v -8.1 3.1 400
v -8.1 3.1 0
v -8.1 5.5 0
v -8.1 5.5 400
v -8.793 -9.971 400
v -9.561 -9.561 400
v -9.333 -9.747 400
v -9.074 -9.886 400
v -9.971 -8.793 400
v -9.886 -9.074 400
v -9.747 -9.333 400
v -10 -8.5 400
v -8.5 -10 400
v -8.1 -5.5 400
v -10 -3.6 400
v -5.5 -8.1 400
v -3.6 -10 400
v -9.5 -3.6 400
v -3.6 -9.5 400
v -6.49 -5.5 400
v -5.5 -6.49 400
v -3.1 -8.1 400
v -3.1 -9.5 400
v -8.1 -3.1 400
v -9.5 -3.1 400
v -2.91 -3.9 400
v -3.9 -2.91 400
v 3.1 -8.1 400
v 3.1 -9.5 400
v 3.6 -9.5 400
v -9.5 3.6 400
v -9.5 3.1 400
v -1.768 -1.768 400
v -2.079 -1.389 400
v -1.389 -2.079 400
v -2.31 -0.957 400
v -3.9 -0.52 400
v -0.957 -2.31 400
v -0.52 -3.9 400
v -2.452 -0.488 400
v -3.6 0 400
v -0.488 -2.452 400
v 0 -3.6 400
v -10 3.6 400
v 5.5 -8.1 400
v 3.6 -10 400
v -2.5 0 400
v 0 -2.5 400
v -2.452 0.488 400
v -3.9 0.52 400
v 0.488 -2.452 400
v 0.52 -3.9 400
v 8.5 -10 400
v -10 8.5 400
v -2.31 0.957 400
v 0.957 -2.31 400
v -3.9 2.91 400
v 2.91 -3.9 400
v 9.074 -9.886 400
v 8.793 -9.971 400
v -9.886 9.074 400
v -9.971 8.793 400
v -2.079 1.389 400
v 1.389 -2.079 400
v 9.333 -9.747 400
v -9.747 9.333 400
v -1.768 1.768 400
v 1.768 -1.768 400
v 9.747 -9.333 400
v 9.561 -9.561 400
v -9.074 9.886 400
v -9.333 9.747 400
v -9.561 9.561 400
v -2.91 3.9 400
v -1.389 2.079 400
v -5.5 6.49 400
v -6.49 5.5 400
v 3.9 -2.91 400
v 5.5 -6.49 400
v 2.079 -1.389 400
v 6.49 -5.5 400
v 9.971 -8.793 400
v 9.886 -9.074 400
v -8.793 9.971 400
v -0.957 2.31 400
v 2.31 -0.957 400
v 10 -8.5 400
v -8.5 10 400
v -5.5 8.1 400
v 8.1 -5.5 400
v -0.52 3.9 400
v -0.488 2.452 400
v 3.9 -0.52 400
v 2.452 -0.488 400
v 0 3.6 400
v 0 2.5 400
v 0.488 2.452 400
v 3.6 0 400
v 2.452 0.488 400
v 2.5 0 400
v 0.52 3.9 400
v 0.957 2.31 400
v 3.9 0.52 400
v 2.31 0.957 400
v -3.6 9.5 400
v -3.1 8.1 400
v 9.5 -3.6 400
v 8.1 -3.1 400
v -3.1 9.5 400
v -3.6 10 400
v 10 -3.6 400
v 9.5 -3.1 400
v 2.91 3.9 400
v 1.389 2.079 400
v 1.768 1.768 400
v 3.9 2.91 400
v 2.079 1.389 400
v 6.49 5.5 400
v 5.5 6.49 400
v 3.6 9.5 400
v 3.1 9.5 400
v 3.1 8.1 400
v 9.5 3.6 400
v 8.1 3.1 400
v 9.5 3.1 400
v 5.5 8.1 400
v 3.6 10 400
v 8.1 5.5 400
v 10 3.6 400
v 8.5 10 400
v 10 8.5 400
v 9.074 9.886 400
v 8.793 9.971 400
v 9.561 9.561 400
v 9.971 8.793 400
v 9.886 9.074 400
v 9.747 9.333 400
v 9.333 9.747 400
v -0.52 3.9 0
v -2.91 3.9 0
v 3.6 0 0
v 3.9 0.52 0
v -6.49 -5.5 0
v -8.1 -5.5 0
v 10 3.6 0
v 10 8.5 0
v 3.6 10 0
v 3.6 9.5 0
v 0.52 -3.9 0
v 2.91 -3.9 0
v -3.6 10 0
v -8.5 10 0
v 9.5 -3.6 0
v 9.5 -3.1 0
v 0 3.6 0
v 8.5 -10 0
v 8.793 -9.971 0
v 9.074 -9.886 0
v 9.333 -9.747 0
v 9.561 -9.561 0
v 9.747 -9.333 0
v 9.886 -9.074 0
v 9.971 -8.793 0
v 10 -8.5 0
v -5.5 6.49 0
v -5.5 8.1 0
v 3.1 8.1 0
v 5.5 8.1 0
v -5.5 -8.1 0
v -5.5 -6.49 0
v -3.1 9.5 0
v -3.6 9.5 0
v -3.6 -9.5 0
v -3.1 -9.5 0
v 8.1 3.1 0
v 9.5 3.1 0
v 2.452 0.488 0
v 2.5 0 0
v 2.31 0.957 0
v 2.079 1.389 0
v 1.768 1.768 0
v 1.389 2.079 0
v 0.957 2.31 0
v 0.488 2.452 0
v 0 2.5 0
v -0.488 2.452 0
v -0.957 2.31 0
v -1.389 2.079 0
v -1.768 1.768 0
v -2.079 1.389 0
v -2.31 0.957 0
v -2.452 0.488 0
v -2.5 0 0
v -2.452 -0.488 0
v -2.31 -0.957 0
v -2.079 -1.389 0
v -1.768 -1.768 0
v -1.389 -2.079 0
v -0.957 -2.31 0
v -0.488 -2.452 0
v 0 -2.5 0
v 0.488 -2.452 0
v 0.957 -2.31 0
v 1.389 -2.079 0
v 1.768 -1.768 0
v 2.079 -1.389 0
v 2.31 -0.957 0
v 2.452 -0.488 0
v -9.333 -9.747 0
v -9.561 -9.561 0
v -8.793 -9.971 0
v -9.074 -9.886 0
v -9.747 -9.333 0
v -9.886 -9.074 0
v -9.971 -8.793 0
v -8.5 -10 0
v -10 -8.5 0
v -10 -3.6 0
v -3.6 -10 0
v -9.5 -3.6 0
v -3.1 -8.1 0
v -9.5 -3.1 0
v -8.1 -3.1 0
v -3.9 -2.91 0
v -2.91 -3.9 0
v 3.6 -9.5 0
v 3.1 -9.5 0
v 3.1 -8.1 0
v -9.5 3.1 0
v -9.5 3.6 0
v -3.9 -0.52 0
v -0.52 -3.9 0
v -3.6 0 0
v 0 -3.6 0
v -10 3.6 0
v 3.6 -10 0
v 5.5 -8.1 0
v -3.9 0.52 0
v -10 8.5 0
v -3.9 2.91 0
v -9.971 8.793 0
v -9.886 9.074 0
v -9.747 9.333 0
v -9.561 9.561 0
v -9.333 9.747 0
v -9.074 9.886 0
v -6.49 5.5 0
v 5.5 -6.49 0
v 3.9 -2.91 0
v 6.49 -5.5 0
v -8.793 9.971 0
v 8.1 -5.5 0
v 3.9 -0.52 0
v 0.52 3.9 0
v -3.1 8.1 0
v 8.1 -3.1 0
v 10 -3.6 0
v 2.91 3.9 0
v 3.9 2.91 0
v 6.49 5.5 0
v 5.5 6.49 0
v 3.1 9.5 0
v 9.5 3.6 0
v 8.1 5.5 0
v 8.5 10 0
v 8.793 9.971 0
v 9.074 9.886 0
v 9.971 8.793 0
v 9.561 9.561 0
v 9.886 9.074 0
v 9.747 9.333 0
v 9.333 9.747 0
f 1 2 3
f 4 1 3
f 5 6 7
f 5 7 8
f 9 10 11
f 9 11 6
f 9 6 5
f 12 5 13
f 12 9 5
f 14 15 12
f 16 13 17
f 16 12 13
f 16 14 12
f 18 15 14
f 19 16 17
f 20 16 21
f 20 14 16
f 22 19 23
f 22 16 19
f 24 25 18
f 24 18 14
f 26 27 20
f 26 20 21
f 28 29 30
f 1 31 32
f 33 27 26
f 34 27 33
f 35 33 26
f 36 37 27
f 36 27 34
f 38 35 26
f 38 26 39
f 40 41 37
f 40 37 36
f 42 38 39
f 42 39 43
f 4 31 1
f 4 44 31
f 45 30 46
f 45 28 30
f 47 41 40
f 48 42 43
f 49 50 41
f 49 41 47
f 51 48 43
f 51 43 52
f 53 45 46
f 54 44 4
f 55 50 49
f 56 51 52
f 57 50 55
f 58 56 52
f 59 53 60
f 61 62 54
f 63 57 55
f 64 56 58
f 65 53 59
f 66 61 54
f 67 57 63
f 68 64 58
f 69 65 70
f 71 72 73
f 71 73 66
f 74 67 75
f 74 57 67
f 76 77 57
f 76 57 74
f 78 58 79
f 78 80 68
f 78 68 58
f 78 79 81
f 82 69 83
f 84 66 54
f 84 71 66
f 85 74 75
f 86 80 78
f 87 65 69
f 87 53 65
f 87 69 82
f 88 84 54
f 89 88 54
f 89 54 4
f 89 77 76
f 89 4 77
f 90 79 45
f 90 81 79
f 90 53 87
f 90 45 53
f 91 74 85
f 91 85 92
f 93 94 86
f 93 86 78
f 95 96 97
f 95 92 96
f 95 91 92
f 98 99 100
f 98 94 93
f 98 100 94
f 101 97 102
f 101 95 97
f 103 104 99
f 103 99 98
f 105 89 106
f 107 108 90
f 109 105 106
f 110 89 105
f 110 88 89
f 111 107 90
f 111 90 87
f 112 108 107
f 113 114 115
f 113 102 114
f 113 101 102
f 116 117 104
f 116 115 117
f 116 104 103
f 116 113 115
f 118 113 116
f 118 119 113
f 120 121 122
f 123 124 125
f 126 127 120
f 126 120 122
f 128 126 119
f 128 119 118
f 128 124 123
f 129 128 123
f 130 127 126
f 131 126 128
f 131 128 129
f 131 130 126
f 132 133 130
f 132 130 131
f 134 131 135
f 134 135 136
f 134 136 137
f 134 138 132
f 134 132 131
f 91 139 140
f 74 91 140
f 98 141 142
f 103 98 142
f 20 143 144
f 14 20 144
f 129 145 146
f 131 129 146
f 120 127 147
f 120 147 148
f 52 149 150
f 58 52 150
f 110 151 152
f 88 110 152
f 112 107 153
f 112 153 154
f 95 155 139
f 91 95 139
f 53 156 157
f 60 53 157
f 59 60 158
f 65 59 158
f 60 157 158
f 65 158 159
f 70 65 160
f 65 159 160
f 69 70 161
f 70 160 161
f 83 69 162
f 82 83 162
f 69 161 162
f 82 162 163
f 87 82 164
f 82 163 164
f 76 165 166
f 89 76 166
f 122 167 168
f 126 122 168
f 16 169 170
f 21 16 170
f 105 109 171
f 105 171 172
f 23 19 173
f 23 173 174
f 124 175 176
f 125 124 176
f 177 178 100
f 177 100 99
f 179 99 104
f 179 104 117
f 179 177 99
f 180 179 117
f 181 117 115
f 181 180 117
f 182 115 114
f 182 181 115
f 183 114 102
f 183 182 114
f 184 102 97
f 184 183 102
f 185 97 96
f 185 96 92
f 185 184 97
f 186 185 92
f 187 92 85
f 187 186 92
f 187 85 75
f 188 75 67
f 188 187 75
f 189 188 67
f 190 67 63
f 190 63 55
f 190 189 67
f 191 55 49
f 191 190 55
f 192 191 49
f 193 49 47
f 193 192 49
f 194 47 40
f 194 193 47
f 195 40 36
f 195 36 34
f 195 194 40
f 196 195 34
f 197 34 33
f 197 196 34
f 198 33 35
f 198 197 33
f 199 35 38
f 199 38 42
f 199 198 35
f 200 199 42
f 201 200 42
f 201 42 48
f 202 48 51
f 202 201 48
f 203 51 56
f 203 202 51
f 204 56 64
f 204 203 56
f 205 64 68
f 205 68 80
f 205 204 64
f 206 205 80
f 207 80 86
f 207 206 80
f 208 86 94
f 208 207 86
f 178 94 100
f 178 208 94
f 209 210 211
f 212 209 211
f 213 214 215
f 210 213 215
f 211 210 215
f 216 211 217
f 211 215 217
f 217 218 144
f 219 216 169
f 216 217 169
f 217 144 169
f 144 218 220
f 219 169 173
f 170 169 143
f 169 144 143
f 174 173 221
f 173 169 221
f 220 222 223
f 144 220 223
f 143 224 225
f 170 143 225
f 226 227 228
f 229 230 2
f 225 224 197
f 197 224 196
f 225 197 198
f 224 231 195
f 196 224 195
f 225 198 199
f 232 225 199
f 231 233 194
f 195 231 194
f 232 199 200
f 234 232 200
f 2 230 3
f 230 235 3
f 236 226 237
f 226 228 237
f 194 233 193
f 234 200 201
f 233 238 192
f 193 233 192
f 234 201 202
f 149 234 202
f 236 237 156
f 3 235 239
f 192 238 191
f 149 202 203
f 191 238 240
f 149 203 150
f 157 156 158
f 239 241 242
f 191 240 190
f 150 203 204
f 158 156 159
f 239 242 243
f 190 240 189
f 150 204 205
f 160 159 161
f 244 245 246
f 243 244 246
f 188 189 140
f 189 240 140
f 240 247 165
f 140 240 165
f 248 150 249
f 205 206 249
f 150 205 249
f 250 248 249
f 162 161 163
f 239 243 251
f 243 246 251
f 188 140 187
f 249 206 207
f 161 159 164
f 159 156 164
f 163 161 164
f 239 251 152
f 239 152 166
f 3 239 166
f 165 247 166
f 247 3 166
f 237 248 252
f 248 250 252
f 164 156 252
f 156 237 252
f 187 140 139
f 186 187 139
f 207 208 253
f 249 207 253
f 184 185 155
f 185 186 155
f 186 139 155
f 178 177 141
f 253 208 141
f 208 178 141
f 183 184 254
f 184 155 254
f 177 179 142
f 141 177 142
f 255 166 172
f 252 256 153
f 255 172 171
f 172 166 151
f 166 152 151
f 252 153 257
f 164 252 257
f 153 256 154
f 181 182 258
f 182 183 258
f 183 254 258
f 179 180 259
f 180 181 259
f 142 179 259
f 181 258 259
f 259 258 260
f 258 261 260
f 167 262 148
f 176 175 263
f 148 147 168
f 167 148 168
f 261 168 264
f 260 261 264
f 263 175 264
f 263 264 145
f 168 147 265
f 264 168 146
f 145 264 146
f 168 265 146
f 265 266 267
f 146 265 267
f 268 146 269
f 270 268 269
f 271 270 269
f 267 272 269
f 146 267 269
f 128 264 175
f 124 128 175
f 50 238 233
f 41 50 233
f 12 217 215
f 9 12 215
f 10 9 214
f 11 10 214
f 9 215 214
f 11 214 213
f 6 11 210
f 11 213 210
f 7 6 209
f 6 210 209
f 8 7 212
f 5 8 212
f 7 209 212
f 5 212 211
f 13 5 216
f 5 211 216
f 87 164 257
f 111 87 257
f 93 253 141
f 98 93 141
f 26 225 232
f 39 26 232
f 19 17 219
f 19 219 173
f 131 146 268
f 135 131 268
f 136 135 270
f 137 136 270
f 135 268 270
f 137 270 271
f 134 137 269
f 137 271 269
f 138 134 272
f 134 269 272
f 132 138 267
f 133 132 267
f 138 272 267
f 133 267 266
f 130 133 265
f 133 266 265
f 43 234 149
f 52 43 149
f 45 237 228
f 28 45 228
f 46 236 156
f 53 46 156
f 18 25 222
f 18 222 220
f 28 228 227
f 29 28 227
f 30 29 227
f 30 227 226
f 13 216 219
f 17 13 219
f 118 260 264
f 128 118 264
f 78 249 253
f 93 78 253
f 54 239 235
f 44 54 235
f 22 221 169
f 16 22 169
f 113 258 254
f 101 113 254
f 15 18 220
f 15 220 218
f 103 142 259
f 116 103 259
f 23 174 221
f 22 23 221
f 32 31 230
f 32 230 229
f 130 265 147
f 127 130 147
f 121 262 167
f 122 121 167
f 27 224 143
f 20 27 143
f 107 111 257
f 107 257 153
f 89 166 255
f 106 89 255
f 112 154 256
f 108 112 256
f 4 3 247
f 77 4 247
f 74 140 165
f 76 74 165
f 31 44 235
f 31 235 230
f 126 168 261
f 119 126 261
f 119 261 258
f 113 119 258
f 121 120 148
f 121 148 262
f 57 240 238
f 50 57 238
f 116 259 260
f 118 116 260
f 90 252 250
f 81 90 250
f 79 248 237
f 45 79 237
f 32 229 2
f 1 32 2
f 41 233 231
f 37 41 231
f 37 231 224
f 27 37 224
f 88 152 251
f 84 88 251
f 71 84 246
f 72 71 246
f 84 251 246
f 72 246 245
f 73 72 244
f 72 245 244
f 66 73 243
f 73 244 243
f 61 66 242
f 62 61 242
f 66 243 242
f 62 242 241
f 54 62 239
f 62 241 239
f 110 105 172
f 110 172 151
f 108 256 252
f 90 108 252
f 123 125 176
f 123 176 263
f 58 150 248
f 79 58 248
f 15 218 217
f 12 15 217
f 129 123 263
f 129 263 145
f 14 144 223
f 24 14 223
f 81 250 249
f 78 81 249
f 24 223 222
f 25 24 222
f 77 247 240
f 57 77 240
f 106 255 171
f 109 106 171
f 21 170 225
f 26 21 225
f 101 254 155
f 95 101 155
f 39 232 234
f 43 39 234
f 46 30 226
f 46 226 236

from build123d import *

# Parameters (mm, degrees)
SKETCH_28_R     = 2.5
EXTRUDE_1_DEPTH = 400


with BuildPart() as part:
    # 草图28 → 凸台-拉伸1 (new body)
    with BuildSketch(Plane.XY):
        with BuildLine():
            Line((-3.9, -0.519615242), (-3.9, -2.910050506))
            Line((-3.9, -2.910050506), (-6.489949494, -5.5))
            Line((-6.489949494, -5.5), (-8.1, -5.5))
            Line((-8.1, -5.5), (-8.1, -3.1))
            Line((-8.1, -3.1), (-9.5, -3.1))
            Line((-9.5, -3.1), (-9.5, -3.6))
            Line((-9.5, -3.6), (-10, -3.6))
            Line((-10, -3.6), (-10, -8.5))
            ThreePointArc((-10, -8.5), (-9.560660172, -9.560660172), (-8.5, -10))
            Line((-8.5, -10), (-3.6, -10))
            Line((-3.6, -10), (-3.6, -9.5))
            Line((-3.6, -9.5), (-3.1, -9.5))
            Line((-3.1, -9.5), (-3.1, -8.1))
            Line((-3.1, -8.1), (-5.5, -8.1))
            Line((-5.5, -8.1), (-5.5, -6.489949494))
            Line((-5.5, -6.489949494), (-2.910050506, -3.9))
            Line((-2.910050506, -3.9), (-0.519615242, -3.9))
            Line((-0.519615242, -3.9), (0, -3.6))
            Line((0, -3.6), (0.519615242, -3.9))
            Line((0.519615242, -3.9), (2.910050506, -3.9))
            Line((2.910050506, -3.9), (5.5, -6.489949494))
            Line((5.5, -6.489949494), (5.5, -8.1))
            Line((5.5, -8.1), (3.1, -8.1))
            Line((3.1, -8.1), (3.1, -9.5))
            Line((3.1, -9.5), (3.6, -9.5))
            Line((3.6, -9.5), (3.6, -10))
            Line((3.6, -10), (8.5, -10))
            ThreePointArc((8.5, -10), (9.560660172, -9.560660172), (10, -8.5))
            Line((10, -8.5), (10, -3.6))
            Line((10, -3.6), (9.5, -3.6))
            Line((9.5, -3.6), (9.5, -3.1))
            Line((9.5, -3.1), (8.1, -3.1))
            Line((8.1, -3.1), (8.1, -5.5))
            Line((8.1, -5.5), (6.489949494, -5.5))
            Line((6.489949494, -5.5), (3.9, -2.910050506))
            Line((3.9, -2.910050506), (3.9, -0.519615242))
            Line((3.9, -0.519615242), (3.6, 0))
            Line((3.6, 0), (3.9, 0.519615242))
            Line((3.9, 0.519615242), (3.9, 2.910050506))
            Line((3.9, 2.910050506), (6.489949494, 5.5))
            Line((6.489949494, 5.5), (8.1, 5.5))
            Line((8.1, 5.5), (8.1, 3.1))
            Line((8.1, 3.1), (9.5, 3.1))
            Line((9.5, 3.1), (9.5, 3.6))
            Line((9.5, 3.6), (10, 3.6))
            Line((10, 3.6), (10, 8.5))
            ThreePointArc((10, 8.5), (9.560660172, 9.560660172), (8.5, 10))
            Line((8.5, 10), (3.6, 10))
            Line((3.6, 10), (3.6, 9.5))
            Line((3.6, 9.5), (3.1, 9.5))
            Line((3.1, 9.5), (3.1, 8.1))
            Line((3.1, 8.1), (5.5, 8.1))
            Line((5.5, 8.1), (5.5, 6.489949494))
            Line((5.5, 6.489949494), (2.910050506, 3.9))
            Line((2.910050506, 3.9), (0.519615242, 3.9))
            Line((0.519615242, 3.9), (0, 3.6))
            Line((0, 3.6), (-0.519615242, 3.9))
            Line((-0.519615242, 3.9), (-2.910050506, 3.9))
            Line((-2.910050506, 3.9), (-5.5, 6.489949494))
            Line((-5.5, 6.489949494), (-5.5, 8.1))
            Line((-5.5, 8.1), (-3.1, 8.1))
            Line((-3.1, 8.1), (-3.1, 9.5))
            Line((-3.1, 9.5), (-3.6, 9.5))
            Line((-3.6, 9.5), (-3.6, 10))
            Line((-3.6, 10), (-8.5, 10))
            ThreePointArc((-8.5, 10), (-9.560660172, 9.560660172), (-10, 8.5))
            Line((-10, 8.5), (-10, 3.6))
            Line((-10, 3.6), (-9.5, 3.6))
            Line((-9.5, 3.6), (-9.5, 3.1))
            Line((-9.5, 3.1), (-8.1, 3.1))
            Line((-8.1, 3.1), (-8.1, 5.5))
            Line((-8.1, 5.5), (-6.489949494, 5.5))
            Line((-6.489949494, 5.5), (-3.9, 2.910050506))
            Line((-3.9, 2.910050506), (-3.9, 0.519615242))
            Line((-3.9, 0.519615242), (-3.6, 0))
            Line((-3.6, 0), (-3.9, -0.519615242))
        make_face()
        Circle(SKETCH_28_R, mode=Mode.SUBTRACT)
    extrude(amount=EXTRUDE_1_DEPTH)


solid = part.part
